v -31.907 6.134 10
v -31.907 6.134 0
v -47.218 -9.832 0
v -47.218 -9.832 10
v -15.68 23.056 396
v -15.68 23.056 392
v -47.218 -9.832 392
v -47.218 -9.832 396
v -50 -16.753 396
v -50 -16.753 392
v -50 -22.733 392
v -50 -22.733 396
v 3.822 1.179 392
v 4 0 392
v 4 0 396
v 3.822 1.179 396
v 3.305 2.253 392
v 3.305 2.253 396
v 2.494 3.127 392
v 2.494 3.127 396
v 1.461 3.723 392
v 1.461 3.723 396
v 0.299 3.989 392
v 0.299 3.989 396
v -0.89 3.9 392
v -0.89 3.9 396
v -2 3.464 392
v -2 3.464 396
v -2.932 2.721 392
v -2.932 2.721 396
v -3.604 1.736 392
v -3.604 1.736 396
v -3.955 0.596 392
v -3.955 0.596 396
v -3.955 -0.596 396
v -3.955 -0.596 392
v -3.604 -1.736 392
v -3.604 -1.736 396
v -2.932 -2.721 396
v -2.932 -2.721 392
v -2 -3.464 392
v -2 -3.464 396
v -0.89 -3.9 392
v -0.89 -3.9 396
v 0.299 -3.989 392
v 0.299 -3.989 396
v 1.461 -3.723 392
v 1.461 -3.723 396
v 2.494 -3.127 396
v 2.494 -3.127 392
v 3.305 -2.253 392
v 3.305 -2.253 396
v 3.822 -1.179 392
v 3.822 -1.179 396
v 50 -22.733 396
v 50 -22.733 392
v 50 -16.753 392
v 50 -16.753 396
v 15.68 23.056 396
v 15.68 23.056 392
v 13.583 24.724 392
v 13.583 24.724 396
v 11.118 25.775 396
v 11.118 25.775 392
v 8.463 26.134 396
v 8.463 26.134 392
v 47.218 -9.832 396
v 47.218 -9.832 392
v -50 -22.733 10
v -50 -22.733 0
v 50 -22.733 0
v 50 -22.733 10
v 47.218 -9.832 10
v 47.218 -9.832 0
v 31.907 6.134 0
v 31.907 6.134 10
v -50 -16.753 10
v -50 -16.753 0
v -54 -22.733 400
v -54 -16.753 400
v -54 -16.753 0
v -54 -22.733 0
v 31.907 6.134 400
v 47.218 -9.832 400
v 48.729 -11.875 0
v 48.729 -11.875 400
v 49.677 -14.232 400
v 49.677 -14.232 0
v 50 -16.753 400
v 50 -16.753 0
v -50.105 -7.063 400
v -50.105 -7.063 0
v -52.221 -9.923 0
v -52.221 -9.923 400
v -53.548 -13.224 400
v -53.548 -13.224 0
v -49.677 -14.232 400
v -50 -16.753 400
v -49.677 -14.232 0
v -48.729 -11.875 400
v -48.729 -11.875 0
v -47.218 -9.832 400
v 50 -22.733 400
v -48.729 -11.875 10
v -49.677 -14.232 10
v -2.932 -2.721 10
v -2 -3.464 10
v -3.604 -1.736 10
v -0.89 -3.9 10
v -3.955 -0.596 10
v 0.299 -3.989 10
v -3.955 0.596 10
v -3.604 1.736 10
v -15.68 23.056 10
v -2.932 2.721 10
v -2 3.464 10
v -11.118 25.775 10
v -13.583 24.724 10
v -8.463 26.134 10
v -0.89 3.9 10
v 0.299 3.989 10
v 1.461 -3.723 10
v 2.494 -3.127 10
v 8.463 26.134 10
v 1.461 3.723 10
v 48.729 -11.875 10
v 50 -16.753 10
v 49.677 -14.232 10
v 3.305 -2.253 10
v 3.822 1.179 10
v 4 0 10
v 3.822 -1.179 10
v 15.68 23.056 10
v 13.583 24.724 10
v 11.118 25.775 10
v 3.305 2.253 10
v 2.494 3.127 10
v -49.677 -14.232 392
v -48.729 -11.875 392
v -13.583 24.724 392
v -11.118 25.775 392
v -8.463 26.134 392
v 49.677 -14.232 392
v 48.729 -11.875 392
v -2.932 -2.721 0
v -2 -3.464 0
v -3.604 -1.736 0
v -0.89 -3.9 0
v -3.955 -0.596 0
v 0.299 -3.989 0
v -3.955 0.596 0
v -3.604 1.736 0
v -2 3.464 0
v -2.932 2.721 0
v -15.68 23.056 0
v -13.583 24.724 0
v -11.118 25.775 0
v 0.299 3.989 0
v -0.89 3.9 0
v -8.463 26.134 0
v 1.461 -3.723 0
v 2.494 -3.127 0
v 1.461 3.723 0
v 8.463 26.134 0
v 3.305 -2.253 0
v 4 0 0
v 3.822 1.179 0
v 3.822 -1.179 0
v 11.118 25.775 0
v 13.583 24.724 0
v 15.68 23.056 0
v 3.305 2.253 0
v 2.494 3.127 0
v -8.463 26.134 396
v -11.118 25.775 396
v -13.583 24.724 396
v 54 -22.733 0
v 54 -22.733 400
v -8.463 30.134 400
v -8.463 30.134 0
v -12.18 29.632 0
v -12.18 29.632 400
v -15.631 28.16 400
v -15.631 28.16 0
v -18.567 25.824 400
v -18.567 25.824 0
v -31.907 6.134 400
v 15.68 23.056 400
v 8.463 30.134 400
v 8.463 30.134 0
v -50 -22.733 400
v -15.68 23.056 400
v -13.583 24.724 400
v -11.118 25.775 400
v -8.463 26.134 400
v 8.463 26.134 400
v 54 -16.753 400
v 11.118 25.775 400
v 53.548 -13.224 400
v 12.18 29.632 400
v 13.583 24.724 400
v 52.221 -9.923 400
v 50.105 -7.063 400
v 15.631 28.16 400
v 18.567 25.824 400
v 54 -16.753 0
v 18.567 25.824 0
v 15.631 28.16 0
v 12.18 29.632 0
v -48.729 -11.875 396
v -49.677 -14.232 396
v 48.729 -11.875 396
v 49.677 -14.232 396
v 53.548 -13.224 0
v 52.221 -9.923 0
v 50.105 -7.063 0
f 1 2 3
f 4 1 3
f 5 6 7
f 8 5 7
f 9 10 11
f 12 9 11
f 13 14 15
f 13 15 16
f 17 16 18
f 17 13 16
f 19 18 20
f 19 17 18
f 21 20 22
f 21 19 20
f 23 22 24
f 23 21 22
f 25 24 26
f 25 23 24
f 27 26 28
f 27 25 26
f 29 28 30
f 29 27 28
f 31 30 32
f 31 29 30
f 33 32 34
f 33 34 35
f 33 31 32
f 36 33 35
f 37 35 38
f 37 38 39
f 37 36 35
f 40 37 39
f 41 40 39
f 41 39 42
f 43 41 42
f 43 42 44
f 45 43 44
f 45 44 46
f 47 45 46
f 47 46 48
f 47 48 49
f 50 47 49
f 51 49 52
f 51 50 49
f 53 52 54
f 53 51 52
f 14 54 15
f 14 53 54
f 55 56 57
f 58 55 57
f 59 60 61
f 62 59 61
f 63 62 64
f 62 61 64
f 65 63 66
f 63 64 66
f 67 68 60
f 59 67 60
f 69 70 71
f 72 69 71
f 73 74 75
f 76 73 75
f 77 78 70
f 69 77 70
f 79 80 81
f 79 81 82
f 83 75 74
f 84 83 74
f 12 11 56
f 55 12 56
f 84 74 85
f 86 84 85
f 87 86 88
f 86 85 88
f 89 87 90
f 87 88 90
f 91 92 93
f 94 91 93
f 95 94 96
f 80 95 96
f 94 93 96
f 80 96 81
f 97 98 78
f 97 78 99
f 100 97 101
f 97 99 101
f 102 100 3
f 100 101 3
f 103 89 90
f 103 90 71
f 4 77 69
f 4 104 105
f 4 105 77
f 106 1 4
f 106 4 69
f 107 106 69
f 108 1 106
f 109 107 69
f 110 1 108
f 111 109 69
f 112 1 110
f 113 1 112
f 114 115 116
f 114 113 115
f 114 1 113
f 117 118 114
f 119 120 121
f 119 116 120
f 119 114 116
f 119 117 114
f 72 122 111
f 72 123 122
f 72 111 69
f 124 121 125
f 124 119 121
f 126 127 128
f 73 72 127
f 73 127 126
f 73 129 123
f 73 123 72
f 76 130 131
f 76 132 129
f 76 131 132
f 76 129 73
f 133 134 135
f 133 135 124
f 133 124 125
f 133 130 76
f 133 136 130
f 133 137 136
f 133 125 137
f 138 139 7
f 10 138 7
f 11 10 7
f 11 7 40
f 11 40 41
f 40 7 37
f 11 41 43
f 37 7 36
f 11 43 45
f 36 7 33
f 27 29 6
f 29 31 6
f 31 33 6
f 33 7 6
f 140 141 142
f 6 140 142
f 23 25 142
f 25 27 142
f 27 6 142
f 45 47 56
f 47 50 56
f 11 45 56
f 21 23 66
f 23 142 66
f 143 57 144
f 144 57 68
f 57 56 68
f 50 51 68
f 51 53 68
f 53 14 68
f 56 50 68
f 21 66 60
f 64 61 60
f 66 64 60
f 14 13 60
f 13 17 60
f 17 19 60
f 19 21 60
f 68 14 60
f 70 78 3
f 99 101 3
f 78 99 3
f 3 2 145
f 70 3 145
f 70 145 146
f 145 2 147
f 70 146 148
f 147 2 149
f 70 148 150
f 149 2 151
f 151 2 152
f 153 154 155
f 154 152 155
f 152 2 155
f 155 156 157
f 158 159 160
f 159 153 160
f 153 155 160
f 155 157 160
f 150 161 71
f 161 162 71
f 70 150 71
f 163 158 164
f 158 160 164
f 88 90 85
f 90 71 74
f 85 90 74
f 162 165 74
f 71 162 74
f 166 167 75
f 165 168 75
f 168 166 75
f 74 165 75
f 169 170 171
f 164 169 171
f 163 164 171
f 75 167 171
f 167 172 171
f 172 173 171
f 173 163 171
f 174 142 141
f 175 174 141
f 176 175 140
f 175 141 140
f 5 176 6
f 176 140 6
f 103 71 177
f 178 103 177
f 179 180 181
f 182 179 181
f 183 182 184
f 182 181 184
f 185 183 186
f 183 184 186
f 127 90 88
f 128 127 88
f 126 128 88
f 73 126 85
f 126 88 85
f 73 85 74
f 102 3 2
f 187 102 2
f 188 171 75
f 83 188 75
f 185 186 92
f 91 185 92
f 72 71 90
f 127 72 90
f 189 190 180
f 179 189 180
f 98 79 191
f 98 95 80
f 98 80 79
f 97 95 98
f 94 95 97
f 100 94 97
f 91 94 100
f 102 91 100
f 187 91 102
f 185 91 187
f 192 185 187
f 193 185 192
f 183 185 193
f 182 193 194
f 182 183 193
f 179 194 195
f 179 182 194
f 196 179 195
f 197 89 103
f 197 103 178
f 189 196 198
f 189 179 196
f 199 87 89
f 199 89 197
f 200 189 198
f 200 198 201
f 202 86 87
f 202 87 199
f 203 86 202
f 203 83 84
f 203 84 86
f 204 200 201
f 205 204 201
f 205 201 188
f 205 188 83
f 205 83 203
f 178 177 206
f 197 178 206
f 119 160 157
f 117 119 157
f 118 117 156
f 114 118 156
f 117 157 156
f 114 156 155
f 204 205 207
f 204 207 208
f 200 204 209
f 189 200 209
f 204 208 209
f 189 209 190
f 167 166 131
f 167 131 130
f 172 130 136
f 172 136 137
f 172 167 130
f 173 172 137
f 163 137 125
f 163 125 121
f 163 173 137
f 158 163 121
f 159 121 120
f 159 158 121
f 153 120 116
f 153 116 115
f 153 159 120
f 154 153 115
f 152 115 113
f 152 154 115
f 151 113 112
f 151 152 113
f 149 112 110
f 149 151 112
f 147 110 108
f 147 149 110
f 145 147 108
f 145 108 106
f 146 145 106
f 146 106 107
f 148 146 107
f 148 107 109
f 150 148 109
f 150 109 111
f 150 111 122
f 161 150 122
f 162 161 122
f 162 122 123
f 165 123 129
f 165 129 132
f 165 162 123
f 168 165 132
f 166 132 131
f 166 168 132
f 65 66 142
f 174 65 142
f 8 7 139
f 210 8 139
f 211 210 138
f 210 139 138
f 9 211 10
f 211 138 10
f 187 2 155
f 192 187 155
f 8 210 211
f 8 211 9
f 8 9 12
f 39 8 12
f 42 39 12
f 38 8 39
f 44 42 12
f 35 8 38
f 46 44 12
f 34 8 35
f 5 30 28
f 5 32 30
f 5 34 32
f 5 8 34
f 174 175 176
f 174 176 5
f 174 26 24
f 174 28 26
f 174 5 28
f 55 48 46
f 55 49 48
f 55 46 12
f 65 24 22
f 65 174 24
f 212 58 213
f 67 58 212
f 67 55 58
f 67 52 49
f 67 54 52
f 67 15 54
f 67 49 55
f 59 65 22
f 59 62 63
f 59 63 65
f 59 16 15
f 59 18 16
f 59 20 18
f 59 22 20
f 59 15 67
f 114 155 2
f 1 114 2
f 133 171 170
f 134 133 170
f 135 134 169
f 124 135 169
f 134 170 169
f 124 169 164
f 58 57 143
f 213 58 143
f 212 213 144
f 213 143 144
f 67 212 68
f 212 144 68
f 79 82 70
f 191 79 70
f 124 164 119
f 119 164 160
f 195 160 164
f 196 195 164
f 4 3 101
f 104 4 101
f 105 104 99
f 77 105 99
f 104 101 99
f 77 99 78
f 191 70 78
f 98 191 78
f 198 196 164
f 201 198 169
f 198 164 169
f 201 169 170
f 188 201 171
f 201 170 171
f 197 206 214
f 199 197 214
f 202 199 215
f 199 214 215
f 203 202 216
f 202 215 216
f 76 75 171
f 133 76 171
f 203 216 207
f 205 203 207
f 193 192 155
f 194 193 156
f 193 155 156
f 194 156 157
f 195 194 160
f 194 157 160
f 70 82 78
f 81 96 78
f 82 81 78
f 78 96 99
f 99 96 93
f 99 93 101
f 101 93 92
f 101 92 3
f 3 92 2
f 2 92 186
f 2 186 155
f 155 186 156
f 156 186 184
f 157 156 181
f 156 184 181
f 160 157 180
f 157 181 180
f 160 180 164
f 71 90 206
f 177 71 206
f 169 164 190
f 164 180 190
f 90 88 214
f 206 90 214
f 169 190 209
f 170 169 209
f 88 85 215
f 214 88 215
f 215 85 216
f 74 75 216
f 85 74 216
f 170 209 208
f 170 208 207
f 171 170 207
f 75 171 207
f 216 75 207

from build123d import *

# Parameters (mm, degrees)
F1_DEPTH  = 400
F0_R      = 4
F2_DEPTH  = 10
F3_START  = 382
F2_FACE_R = 4
F3_DEPTH  = 4


with BuildPart() as f1:
    # F0 (on Top) → F1 (new body)
    with BuildSketch(Plane.XY):
        with BuildLine():
            Line((-54, -22.7331889315), (-50, -22.7331889315))
            Line((-50, -22.7331889315), (-50, -16.7531133549))
            ThreePointArc((-50, -16.7531133549), (-49.2783785301, -13.0232753086), (-47.2176616296, -9.8317435049))
            Line((-47.2176616296, -9.8317435049), (-31.9070156646, 6.134324528))
            Line((-31.9070156646, 6.134324528), (-15.6802839182, 23.055694378))
            ThreePointArc((-15.6802839182, 23.055694378), (-12.3860328904, 25.3325226804), (-8.4626222886, 26.134324528))
            Line((-8.4626222886, 26.134324528), (8.4626222886, 26.134324528))
            ThreePointArc((8.4626222886, 26.134324528), (12.3860328904, 25.3325226804), (15.6802839182, 23.055694378))
            Line((15.6802839182, 23.055694378), (31.9070156646, 6.134324528))
            Line((31.9070156646, 6.134324528), (47.2176616296, -9.8317435049))
            ThreePointArc((47.2176616296, -9.8317435049), (49.2783785301, -13.0232753086), (50, -16.7531133549))
            Line((50, -16.7531133549), (50, -22.7331889315))
            Line((50, -22.7331889315), (54, -22.7331889315))
            Line((54, -22.7331889315), (54, -16.7531133549))
            ThreePointArc((54, -16.7531133549), (52.9897299422, -11.5313400901), (50.1047262815, -7.0631955649))
            Line((50.1047262815, -7.0631955649), (18.5673485701, 25.824242318))
            ThreePointArc((18.5673485701, 25.824242318), (13.9553971311, 29.0118019413), (8.4626222886, 30.134324528))
            Line((8.4626222886, 30.134324528), (-8.4626222886, 30.134324528))
            ThreePointArc((-8.4626222886, 30.134324528), (-13.9553971311, 29.0118019413), (-18.5673485701, 25.824242318))
            Line((-18.5673485701, 25.824242318), (-50.1047262815, -7.0631955649))
            ThreePointArc((-50.1047262815, -7.0631955649), (-52.9897299422, -11.5313400901), (-54, -16.7531133549))
            Line((-54, -16.7531133549), (-54, -22.7331889315))
        make_face()
    extrude(amount=F1_DEPTH)


with BuildPart() as f2:
    # F0 (on Top) → F2 (new body)
    with BuildSketch(Plane.XY):
        with BuildLine():
            Line((-50, -16.7531133549), (-50, -22.7331889315))
            Line((-50, -22.7331889315), (50, -22.7331889315))
            Line((50, -22.7331889315), (50, -16.7531133549))
            ThreePointArc((50, -16.7531133549), (49.2783785301, -13.0232753086), (47.2176616296, -9.8317435049))
            Line((47.2176616296, -9.8317435049), (31.9070156646, 6.134324528))
            Line((31.9070156646, 6.134324528), (-31.9070156646, 6.134324528))
            Line((-31.9070156646, 6.134324528), (-47.2176616296, -9.8317435049))
            ThreePointArc((-47.2176616296, -9.8317435049), (-49.2783785301, -13.0232753086), (-50, -16.7531133549))
        make_face()
        Circle(F0_R, mode=Mode.SUBTRACT)
        with BuildLine():
            Line((-15.6802839182, 23.055694378), (-31.9070156646, 6.134324528))
            Line((-31.9070156646, 6.134324528), (31.9070156646, 6.134324528))
            Line((31.9070156646, 6.134324528), (15.6802839182, 23.055694378))
            ThreePointArc((15.6802839182, 23.055694378), (12.3860328904, 25.3325226804), (8.4626222886, 26.134324528))
            Line((8.4626222886, 26.134324528), (-8.4626222886, 26.134324528))
            ThreePointArc((-8.4626222886, 26.134324528), (-12.3860328904, 25.3325226804), (-15.6802839182, 23.055694378))
        make_face()
    extrude(amount=F2_DEPTH)


with BuildPart() as f3:
    # F2_face (on face) → F3 (new body)
    with BuildSketch(Plane(origin=(0, -3.2105105513, 10), x_dir=(1, 0, 0), z_dir=(0, 0, 1)).offset(F3_START)):
        with BuildLine():
            ThreePointArc((-47.2176616296, -6.6212329536), (-49.2783785301, -9.8127647572), (-50, -13.5426028036))
            Line((-50, -13.5426028036), (-50, -19.5226783801))
            Line((-50, -19.5226783801), (50, -19.5226783801))
            Line((50, -19.5226783801), (50, -13.5426028036))
            ThreePointArc((50, -13.5426028036), (49.2783785301, -9.8127647572), (47.2176616296, -6.6212329536))
            Line((47.2176616296, -6.6212329536), (15.6802839182, 26.2662049294))
            ThreePointArc((15.6802839182, 26.2662049294), (12.3860328904, 28.5430332317), (8.4626222886, 29.3448350794))
            Line((8.4626222886, 29.3448350794), (-8.4626222886, 29.3448350794))
            ThreePointArc((-8.4626222886, 29.3448350794), (-12.3860328904, 28.5430332317), (-15.6802839182, 26.2662049294))
            Line((-15.6802839182, 26.2662049294), (-47.2176616296, -6.6212329536))
        make_face()
        with Locations((0, 3.2105105513)):
            Circle(F2_FACE_R, mode=Mode.SUBTRACT)
    extrude(amount=F3_DEPTH)


solid = Compound([f1.part, f2.part, f3.part])
